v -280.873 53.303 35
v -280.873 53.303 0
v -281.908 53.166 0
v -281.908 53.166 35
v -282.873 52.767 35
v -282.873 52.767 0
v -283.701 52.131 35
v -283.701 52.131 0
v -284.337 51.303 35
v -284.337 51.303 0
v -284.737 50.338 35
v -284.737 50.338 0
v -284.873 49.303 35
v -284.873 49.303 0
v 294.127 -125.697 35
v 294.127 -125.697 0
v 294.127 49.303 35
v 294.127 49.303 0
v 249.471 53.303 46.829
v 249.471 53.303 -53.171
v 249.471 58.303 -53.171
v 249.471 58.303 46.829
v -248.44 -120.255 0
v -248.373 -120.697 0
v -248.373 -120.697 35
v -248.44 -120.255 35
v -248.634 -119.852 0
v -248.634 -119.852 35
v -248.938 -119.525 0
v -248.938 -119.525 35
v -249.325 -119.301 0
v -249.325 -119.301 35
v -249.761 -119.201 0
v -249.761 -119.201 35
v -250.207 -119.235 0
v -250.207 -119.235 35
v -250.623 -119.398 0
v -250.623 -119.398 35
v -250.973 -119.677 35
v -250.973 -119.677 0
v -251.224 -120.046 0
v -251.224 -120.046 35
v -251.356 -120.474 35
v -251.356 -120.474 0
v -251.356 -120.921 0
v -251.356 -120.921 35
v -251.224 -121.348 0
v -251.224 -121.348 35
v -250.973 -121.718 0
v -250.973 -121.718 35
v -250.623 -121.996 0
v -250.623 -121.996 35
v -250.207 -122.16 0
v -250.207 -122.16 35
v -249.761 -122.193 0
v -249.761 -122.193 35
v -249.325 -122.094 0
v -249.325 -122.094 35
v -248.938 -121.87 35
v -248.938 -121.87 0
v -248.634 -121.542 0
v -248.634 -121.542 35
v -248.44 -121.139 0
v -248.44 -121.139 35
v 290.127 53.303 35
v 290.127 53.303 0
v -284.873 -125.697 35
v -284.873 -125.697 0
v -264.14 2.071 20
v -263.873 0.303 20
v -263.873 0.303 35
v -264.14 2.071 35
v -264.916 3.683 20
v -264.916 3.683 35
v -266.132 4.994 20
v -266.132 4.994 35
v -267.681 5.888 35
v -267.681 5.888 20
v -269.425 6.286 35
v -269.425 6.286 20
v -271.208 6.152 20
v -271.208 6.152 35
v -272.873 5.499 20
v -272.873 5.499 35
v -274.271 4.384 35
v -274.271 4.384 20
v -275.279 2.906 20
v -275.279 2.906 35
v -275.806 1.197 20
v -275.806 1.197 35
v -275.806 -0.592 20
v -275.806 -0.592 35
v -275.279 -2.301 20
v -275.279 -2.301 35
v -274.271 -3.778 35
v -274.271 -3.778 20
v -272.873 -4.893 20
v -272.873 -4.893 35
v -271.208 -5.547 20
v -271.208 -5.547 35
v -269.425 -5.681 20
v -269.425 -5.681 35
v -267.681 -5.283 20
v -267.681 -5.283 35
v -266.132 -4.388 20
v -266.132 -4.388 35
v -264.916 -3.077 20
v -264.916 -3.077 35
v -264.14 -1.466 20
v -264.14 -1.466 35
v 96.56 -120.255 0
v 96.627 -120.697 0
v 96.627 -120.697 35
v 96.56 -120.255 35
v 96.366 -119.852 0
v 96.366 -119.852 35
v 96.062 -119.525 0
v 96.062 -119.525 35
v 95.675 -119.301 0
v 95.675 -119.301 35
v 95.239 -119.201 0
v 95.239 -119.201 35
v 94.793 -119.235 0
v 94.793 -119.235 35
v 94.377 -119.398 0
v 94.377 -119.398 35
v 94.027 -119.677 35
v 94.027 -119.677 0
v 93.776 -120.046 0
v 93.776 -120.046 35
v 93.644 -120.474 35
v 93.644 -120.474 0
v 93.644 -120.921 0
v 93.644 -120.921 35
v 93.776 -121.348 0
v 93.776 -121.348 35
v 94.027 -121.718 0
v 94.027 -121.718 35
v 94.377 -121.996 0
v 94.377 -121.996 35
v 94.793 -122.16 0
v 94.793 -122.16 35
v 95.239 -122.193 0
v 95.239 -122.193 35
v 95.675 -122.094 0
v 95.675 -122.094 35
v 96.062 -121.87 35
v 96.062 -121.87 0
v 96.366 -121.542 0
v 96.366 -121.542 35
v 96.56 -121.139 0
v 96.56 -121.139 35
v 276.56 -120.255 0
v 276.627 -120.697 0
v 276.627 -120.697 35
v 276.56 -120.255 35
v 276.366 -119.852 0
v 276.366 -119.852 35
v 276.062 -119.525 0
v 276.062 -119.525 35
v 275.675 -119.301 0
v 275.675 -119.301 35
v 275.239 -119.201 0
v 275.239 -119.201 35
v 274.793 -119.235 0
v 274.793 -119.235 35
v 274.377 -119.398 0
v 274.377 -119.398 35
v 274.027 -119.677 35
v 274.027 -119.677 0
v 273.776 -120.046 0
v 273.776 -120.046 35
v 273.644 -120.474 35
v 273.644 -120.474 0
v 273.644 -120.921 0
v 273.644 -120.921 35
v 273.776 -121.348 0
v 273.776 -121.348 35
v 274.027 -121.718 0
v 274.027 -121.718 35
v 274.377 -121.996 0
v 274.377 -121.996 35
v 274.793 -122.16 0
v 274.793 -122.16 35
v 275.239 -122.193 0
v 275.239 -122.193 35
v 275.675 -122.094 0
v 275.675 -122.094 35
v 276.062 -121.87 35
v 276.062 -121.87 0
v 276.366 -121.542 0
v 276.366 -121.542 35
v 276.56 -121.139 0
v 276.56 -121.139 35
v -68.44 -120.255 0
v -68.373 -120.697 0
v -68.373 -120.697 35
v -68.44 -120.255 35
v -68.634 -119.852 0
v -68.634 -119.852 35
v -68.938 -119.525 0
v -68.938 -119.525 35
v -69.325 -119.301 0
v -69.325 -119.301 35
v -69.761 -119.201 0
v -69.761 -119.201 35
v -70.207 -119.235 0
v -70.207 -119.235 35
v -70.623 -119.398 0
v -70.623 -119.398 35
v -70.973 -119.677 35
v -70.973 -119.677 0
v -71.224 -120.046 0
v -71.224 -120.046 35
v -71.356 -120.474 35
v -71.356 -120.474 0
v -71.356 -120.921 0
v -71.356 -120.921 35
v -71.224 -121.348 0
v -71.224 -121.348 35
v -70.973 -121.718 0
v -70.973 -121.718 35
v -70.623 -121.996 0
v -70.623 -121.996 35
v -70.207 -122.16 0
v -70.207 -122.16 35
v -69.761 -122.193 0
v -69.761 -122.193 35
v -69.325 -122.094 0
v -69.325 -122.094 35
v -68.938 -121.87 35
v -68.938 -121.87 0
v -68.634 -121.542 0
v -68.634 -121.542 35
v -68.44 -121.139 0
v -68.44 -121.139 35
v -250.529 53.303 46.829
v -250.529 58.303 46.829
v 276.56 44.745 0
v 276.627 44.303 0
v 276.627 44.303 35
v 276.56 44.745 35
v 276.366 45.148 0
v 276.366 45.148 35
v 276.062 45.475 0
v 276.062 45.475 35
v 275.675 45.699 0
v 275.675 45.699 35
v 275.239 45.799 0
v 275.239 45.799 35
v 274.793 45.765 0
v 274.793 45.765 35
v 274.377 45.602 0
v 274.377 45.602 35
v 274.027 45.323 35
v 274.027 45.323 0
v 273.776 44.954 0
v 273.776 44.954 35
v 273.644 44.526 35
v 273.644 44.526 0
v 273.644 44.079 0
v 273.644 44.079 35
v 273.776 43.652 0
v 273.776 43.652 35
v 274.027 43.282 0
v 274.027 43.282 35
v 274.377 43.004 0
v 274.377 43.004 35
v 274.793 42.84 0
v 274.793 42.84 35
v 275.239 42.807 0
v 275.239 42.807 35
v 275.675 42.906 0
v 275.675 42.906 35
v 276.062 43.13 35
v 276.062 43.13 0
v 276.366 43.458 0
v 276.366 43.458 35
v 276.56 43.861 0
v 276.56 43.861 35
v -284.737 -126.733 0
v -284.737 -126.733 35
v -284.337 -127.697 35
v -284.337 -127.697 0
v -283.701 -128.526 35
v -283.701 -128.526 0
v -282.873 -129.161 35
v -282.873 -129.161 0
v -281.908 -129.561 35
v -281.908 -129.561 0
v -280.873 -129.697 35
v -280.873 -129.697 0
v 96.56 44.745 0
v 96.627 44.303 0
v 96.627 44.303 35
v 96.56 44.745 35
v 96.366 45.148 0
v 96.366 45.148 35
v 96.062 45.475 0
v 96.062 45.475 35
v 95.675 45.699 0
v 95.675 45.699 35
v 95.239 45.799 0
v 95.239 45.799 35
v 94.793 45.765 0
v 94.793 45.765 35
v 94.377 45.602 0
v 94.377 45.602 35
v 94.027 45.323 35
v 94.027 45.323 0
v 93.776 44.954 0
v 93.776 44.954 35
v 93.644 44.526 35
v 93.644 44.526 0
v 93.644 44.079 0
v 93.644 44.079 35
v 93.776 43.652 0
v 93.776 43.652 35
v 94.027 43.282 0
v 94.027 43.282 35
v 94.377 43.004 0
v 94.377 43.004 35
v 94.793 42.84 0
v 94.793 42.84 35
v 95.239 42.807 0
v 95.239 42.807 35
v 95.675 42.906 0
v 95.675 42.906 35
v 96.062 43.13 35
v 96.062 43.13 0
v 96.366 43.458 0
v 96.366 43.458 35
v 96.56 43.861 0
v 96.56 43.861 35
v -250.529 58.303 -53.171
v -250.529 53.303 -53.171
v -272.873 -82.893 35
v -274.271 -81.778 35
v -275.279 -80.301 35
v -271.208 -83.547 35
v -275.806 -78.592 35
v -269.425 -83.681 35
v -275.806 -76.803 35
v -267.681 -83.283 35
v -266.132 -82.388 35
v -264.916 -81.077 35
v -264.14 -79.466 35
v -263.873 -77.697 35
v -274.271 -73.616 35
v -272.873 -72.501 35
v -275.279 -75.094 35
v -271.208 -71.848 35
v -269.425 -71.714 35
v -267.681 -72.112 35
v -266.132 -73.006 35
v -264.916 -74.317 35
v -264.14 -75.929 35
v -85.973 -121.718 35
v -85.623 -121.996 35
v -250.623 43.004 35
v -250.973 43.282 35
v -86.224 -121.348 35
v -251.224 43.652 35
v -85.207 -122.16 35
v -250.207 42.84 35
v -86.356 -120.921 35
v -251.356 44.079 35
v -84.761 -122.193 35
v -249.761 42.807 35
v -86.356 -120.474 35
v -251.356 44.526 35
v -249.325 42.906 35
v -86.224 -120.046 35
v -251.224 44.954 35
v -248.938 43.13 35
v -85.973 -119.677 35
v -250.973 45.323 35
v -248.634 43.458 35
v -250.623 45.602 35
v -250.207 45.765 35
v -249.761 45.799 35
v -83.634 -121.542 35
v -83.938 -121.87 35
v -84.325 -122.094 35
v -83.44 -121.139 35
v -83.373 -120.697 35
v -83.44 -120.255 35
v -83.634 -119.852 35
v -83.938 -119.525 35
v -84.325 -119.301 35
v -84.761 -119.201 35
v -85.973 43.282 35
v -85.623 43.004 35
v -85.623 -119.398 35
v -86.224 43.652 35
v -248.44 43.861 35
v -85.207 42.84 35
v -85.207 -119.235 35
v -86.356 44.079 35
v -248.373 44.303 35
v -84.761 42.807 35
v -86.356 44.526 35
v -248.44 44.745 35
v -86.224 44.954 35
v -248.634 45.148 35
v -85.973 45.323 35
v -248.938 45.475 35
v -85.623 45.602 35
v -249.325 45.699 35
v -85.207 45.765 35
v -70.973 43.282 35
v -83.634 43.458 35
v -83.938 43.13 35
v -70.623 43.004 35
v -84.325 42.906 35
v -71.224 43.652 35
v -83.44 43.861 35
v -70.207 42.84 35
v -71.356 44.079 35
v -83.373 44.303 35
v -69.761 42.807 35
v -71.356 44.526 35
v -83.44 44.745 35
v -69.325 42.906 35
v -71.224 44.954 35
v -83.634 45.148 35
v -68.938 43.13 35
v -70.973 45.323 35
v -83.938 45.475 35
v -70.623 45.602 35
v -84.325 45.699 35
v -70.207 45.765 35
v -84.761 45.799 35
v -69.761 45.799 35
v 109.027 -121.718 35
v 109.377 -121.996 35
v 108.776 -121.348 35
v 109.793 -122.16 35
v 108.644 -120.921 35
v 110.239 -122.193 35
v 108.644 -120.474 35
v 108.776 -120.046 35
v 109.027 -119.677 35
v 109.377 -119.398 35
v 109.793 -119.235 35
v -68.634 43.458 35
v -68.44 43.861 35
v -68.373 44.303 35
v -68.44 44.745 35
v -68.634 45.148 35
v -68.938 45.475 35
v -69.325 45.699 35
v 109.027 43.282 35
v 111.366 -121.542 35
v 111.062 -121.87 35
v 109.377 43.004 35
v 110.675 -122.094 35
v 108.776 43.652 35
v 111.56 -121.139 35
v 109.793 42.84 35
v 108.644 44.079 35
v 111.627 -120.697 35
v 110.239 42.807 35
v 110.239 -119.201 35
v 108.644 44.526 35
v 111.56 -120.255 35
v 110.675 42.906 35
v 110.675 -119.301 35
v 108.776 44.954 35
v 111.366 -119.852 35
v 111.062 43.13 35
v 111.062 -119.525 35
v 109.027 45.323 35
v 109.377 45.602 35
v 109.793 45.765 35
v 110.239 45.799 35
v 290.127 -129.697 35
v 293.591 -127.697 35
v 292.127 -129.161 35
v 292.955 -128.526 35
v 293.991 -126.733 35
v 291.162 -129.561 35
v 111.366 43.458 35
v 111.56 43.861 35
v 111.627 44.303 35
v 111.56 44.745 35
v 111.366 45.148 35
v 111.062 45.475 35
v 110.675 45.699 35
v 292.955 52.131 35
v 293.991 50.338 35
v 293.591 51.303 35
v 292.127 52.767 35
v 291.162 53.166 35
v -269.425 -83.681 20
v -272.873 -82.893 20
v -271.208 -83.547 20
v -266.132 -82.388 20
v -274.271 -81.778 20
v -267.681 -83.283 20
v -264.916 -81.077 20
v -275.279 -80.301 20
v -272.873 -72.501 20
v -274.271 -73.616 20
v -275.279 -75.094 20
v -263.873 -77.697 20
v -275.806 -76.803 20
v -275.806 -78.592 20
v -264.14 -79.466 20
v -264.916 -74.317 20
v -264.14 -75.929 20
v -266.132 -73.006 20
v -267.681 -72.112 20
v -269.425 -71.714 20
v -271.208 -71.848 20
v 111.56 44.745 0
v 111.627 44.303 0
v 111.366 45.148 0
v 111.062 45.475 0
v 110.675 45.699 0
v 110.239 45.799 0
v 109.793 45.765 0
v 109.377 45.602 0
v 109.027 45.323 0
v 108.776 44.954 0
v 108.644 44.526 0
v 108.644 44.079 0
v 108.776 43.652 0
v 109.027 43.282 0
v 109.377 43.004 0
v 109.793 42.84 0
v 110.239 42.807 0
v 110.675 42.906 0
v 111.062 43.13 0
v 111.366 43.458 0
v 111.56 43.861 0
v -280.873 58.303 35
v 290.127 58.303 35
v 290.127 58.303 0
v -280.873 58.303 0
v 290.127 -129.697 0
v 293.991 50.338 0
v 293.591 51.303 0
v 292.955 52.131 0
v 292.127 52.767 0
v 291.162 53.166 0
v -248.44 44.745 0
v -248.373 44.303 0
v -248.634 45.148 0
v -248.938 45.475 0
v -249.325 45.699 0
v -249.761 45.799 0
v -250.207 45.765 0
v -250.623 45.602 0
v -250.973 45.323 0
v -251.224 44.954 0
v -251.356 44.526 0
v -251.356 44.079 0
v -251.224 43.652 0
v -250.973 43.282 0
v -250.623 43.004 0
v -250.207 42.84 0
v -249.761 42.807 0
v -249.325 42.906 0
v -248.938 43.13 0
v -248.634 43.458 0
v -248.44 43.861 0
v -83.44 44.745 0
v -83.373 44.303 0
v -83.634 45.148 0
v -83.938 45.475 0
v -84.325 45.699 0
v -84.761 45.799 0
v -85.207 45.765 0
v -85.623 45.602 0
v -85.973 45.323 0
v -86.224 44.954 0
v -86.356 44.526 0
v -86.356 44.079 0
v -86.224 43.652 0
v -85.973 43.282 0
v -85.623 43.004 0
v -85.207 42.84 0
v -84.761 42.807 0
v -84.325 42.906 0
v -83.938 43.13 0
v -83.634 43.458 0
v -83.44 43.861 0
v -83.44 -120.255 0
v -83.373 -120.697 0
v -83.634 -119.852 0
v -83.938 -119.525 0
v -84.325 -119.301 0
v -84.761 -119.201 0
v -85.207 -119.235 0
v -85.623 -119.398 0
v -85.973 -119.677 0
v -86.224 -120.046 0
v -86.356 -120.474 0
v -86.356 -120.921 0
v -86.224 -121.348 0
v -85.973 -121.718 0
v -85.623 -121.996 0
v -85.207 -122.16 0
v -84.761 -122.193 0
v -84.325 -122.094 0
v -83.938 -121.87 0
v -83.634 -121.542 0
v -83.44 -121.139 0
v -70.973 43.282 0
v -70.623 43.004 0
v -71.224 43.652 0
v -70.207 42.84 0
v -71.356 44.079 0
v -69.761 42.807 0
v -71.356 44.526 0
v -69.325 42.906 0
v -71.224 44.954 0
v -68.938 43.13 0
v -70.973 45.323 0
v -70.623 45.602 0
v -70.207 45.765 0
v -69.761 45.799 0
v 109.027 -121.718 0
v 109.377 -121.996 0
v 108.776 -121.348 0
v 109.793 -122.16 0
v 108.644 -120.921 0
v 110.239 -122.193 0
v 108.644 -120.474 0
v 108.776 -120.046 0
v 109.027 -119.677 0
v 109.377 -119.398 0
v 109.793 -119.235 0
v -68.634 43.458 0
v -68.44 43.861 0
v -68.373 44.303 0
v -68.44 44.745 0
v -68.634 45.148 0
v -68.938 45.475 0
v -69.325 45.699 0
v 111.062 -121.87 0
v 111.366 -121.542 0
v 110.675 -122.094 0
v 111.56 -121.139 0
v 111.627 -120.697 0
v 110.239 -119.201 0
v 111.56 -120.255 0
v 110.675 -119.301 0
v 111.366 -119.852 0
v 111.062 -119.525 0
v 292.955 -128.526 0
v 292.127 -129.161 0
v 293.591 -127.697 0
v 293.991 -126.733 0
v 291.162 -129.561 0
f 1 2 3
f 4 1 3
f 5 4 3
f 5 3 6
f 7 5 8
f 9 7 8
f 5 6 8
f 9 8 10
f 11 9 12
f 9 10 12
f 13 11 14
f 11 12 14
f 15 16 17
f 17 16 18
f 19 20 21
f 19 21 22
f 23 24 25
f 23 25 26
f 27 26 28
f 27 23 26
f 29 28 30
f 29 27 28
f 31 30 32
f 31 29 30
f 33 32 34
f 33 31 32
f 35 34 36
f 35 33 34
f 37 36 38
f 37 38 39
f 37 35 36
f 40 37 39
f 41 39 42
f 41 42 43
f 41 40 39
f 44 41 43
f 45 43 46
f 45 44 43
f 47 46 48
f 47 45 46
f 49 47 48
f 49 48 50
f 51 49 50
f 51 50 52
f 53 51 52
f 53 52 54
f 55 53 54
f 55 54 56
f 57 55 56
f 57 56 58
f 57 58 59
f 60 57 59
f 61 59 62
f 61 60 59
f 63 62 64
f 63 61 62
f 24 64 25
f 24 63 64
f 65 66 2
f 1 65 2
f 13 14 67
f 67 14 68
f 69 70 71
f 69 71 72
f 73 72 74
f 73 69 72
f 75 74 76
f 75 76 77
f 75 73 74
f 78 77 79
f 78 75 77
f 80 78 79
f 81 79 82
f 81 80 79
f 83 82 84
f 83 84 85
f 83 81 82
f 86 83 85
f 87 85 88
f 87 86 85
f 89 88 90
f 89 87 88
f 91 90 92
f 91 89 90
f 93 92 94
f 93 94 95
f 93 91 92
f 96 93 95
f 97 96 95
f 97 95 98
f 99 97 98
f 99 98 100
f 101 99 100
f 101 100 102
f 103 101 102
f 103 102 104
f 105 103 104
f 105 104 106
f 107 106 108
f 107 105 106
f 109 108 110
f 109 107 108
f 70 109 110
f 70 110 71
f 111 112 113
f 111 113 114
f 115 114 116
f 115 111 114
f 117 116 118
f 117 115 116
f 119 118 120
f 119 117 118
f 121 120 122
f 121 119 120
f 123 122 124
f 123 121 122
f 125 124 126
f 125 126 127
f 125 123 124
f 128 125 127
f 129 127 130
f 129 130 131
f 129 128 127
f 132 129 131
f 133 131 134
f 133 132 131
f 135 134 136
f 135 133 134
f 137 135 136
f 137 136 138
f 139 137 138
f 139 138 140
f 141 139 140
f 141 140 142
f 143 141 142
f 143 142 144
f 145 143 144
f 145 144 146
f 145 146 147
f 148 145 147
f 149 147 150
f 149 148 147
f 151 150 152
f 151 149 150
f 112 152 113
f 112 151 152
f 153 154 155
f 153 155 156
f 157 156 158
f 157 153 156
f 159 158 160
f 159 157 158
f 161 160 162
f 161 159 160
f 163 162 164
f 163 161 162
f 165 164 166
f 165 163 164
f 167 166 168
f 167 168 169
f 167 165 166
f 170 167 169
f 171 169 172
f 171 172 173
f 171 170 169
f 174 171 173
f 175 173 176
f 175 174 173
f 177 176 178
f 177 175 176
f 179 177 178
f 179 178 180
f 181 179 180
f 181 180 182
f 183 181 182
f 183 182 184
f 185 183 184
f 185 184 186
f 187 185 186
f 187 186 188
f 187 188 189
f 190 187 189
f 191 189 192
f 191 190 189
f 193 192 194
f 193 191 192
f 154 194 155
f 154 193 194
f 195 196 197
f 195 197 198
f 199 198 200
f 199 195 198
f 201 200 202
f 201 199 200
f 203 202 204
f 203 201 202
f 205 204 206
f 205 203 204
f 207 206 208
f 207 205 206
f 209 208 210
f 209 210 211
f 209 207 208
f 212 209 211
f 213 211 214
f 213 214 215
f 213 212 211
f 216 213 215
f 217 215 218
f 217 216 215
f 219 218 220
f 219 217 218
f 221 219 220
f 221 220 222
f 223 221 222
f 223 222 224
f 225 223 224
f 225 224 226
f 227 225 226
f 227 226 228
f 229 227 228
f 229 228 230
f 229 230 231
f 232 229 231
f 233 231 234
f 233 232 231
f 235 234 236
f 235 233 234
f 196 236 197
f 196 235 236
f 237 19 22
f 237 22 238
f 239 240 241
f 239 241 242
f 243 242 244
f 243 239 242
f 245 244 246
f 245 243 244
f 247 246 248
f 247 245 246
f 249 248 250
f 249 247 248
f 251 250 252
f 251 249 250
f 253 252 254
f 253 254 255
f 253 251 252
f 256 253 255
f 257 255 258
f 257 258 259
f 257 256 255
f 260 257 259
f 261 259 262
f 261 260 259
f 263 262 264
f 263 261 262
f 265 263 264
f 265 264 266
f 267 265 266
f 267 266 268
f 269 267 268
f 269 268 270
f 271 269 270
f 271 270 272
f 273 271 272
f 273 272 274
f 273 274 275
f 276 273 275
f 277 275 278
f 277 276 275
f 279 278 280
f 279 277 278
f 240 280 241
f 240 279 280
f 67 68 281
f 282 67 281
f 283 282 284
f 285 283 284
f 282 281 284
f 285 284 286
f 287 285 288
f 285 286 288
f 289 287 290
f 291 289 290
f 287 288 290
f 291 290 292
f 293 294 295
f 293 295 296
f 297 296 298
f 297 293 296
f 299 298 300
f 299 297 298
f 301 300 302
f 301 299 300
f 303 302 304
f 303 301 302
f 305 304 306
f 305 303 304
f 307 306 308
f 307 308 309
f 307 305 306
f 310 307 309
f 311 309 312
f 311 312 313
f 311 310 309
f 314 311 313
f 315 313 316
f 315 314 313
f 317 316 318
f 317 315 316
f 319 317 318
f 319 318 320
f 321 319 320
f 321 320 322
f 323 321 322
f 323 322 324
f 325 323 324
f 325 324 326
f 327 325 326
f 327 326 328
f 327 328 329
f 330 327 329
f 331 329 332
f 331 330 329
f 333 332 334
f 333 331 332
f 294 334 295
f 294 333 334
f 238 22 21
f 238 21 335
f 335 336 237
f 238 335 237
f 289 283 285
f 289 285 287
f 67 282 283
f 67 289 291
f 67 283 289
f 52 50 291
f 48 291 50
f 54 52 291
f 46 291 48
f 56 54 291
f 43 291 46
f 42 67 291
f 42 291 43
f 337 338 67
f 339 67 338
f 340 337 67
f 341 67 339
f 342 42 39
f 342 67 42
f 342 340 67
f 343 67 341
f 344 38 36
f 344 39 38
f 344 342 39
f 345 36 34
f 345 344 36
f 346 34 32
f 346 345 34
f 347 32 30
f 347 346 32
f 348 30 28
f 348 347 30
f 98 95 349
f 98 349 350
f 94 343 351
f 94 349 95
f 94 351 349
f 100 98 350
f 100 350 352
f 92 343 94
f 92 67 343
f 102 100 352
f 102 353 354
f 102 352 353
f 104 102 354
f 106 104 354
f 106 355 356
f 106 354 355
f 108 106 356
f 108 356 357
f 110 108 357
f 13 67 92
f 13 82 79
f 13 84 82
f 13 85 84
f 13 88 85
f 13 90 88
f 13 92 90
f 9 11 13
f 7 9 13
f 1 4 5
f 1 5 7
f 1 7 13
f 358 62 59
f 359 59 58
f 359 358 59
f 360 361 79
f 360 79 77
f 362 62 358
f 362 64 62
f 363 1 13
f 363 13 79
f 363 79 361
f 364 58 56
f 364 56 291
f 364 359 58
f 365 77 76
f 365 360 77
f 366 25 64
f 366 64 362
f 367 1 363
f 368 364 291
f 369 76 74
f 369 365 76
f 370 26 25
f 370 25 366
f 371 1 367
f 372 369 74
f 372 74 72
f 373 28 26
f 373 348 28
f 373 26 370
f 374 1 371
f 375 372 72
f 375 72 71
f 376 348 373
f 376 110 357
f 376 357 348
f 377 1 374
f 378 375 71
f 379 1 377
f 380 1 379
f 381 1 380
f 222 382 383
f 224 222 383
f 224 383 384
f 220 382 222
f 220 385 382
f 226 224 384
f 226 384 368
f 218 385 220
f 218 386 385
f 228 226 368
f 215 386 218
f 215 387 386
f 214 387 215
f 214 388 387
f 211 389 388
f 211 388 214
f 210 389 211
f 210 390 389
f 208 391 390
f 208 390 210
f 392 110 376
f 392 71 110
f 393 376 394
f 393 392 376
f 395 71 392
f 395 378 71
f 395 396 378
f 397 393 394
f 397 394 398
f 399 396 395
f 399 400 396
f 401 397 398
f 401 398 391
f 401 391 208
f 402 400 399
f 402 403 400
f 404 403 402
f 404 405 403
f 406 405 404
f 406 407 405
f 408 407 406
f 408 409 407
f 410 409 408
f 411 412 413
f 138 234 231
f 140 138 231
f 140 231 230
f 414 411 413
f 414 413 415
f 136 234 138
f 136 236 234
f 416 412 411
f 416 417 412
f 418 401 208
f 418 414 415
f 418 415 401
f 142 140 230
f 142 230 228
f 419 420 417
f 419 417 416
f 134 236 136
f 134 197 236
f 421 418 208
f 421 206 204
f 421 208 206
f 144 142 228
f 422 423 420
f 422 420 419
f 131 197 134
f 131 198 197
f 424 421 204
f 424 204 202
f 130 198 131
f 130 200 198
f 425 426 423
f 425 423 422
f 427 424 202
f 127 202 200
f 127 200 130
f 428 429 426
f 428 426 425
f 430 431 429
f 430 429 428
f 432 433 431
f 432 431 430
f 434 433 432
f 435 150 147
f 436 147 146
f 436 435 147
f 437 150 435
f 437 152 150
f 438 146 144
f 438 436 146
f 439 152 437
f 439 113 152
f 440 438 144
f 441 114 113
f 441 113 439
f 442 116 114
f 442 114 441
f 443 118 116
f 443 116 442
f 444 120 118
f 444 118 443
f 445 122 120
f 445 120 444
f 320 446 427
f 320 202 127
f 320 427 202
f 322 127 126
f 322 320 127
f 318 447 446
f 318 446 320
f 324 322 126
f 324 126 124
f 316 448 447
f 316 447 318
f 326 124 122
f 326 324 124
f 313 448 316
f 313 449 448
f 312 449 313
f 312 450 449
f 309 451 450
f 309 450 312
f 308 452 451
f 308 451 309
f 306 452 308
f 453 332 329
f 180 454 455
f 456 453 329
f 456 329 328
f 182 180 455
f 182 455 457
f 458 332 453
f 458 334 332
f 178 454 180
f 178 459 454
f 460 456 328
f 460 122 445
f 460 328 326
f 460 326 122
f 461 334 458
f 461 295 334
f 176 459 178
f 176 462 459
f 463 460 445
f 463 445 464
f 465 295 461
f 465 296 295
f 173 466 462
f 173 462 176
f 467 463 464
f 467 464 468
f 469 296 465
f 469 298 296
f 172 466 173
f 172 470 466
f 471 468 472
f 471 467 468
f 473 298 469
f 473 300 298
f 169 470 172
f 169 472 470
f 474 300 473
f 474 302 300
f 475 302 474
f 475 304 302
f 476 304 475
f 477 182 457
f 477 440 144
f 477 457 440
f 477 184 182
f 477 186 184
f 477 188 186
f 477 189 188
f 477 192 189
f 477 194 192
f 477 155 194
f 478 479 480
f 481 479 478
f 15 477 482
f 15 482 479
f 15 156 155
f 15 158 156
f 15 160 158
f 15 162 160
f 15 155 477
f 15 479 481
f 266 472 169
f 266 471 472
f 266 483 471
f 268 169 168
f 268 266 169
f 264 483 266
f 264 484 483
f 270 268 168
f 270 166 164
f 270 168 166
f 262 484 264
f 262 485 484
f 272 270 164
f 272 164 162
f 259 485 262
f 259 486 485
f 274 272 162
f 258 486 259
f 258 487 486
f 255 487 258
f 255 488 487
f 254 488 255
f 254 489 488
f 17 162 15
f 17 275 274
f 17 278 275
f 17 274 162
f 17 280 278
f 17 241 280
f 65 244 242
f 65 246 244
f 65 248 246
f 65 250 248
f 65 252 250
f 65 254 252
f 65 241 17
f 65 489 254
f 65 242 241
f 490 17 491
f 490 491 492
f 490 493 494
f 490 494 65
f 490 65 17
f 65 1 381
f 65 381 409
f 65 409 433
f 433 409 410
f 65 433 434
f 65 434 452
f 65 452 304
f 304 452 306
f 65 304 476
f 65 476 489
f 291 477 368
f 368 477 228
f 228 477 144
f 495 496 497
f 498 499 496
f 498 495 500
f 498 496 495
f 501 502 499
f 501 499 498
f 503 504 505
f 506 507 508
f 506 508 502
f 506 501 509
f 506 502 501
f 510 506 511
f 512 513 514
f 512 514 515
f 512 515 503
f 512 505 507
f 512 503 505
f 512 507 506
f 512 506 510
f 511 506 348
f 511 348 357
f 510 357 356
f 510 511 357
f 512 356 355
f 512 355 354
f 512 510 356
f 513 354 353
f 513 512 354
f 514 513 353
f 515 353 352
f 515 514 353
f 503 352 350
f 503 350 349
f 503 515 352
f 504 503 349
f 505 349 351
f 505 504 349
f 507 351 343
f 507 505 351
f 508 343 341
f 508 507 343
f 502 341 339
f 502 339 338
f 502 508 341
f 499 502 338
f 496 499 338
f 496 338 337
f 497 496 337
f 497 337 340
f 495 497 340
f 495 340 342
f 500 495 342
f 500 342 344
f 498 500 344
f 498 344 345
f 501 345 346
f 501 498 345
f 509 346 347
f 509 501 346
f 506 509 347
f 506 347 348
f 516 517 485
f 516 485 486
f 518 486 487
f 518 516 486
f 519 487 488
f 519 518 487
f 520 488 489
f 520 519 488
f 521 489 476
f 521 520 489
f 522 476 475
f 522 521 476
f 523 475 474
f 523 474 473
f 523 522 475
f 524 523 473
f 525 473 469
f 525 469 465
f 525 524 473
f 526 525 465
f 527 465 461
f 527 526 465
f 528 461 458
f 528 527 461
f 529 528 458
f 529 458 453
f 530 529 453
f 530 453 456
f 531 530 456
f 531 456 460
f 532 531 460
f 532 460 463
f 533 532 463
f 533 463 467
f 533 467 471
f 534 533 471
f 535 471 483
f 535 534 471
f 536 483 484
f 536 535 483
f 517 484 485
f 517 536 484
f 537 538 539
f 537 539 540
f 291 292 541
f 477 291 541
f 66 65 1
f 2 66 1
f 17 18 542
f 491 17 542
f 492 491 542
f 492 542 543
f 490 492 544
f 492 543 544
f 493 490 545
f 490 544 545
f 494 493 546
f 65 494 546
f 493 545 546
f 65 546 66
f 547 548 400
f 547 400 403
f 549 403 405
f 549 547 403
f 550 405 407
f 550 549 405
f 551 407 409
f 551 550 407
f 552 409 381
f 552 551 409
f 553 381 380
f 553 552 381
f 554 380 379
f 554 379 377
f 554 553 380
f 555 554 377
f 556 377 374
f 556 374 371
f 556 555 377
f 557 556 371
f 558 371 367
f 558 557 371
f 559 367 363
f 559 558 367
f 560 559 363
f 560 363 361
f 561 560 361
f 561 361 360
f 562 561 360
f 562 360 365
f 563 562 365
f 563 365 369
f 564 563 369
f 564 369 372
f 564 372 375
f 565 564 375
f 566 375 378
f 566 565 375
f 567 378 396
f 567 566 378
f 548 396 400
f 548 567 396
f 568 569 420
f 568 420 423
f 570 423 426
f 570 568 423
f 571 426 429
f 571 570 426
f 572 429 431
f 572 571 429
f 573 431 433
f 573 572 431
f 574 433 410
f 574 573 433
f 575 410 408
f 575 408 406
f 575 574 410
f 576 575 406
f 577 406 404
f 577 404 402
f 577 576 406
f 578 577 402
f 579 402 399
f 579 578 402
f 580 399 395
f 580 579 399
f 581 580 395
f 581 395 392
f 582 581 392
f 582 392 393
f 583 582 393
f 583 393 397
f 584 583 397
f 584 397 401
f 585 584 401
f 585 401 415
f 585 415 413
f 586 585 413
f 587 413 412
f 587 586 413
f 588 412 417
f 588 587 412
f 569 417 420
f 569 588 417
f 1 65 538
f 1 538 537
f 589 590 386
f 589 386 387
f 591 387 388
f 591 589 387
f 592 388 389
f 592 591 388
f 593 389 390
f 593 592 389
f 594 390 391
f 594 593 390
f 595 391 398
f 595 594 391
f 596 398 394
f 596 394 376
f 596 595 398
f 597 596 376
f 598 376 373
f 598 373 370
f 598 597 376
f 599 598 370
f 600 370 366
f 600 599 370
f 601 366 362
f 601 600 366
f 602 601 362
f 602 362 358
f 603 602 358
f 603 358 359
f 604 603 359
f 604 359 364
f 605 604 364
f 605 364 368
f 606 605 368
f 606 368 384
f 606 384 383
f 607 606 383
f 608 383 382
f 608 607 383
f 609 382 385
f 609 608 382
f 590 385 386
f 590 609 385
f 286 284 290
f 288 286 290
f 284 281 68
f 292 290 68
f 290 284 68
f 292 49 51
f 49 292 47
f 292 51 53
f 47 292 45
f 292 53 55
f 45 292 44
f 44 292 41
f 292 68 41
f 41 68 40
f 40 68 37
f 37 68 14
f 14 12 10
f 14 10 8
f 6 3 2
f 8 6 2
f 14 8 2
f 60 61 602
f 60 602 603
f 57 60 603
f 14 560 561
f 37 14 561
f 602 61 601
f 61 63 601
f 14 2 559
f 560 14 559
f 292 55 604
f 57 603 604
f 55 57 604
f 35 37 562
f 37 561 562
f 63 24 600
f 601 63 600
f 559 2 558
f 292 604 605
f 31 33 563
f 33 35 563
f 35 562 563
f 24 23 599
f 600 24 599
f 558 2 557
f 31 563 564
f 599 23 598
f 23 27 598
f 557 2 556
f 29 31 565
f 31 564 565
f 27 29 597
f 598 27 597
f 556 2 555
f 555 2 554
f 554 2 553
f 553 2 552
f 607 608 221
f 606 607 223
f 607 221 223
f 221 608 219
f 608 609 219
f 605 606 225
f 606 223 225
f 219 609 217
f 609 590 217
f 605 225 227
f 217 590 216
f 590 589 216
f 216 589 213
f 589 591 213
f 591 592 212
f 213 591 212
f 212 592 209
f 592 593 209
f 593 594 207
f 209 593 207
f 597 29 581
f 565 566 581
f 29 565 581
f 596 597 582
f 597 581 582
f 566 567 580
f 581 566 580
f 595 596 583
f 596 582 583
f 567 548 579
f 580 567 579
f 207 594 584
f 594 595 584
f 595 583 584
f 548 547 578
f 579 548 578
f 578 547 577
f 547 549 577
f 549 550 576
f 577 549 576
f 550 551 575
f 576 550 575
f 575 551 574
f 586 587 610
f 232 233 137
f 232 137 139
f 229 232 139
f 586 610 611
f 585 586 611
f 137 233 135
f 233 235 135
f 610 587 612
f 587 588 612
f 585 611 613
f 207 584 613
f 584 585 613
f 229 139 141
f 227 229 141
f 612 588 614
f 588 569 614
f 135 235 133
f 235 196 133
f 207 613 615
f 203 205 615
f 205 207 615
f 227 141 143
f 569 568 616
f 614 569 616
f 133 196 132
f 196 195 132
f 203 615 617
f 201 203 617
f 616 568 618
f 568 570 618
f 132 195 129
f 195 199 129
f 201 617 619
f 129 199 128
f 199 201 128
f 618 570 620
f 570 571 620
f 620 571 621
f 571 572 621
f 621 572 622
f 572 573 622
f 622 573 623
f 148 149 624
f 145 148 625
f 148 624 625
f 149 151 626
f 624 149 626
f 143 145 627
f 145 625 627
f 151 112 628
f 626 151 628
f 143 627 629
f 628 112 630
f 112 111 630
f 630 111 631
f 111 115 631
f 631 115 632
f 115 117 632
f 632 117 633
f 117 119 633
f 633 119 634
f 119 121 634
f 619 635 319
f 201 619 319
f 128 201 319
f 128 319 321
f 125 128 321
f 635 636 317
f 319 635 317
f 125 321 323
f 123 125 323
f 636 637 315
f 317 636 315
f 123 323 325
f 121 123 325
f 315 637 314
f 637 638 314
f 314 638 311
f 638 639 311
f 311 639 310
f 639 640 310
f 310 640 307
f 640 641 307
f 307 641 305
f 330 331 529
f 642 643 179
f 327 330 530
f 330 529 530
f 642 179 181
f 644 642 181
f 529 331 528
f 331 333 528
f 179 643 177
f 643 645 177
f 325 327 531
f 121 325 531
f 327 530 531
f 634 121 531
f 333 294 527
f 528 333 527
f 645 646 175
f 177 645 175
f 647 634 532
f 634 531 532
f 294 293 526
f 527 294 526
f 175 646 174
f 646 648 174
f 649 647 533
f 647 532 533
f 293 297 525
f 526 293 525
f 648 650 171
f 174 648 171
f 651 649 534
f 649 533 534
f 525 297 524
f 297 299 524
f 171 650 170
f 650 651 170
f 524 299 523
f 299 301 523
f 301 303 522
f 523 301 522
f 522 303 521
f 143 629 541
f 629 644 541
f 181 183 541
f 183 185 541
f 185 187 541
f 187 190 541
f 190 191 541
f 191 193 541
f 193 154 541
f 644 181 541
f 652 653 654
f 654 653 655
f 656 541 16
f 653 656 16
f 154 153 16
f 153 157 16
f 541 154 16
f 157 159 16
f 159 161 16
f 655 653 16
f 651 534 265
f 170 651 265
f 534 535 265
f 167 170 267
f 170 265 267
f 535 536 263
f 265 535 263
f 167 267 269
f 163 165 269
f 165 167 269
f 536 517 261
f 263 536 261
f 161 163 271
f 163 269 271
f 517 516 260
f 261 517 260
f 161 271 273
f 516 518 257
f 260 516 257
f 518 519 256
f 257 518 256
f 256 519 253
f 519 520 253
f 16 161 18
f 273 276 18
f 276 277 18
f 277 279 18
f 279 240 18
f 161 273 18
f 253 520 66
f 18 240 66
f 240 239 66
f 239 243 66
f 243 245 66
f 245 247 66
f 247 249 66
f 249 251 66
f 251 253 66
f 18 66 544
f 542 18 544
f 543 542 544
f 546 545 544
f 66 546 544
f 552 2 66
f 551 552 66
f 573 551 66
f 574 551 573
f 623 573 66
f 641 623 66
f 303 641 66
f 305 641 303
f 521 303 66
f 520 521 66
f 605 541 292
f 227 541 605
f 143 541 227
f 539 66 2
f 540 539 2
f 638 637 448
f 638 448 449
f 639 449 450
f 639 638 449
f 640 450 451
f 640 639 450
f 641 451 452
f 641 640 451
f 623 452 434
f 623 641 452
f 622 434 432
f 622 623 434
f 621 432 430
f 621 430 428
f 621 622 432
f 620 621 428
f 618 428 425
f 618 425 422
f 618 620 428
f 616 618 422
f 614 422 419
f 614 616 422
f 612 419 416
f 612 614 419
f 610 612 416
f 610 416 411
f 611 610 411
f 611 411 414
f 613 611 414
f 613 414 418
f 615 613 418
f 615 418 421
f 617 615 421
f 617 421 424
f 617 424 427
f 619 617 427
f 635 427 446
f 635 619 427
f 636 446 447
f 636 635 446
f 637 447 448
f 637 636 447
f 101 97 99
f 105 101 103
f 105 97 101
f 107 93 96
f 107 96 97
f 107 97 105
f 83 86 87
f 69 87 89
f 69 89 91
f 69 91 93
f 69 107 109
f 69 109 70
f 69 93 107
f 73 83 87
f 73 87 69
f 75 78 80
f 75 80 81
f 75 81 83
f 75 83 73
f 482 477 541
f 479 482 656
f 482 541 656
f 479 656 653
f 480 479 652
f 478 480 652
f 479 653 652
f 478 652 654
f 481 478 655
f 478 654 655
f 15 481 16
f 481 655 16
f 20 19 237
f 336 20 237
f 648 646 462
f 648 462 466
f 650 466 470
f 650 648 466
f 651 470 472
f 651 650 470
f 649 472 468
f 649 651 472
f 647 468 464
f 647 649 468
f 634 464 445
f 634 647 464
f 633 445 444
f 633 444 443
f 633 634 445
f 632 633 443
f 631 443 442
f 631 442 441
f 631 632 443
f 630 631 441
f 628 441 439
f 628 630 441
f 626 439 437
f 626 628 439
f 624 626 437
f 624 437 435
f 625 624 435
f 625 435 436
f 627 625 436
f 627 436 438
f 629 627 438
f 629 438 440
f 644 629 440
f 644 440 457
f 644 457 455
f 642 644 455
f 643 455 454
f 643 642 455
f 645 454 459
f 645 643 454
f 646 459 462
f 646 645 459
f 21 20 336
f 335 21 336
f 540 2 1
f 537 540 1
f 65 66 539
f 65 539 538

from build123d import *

# Parameters (mm, degrees)
F0_R     = 1.5
F0_R_2   = 6
F1_DEPTH = 35
F2_START = 20
F2_DEPTH = 15
F3_W     = 571
F3_H     = 35
F4_DEPTH = 5
F5_W     = 500
F5_H     = 100
F6_DEPTH = 5


with BuildPart() as f1:
    # F0 (on Top) → F1 (new body)
    with BuildSketch(Plane.XY):
        with BuildLine():
            Line((290.1270191669, 53.3027102947), (-280.8729808331, 53.3027102947))
            ThreePointArc((-280.8729808331, 53.3027102947), (-283.7014079578, 52.1311374195), (-284.8729808331, 49.3027102947))
            Line((-284.8729808331, 49.3027102947), (-284.8729808331, -125.6972897053))
            ThreePointArc((-284.8729808331, -125.6972897053), (-283.7014079578, -128.52571683), (-280.8729808331, -129.6972897053))
            Line((-280.8729808331, -129.6972897053), (290.1270191669, -129.6972897053))
            ThreePointArc((290.1270191669, -129.6972897053), (292.9554462917, -128.52571683), (294.1270191669, -125.6972897053))
            Line((294.1270191669, -125.6972897053), (294.1270191669, 49.3027102947))
            ThreePointArc((294.1270191669, 49.3027102947), (292.9554462917, 52.1311374195), (290.1270191669, 53.3027102947))
        make_face()
        with Locations((-249.8729808331, -120.6972897053)):
            Circle(F0_R, mode=Mode.SUBTRACT)
        with Locations((-84.8729808331, -120.6972897053)):
            Circle(F0_R, mode=Mode.SUBTRACT)
        with Locations((-69.8729808331, -120.6972897053)):
            Circle(F0_R, mode=Mode.SUBTRACT)
        with Locations((-269.8729808331, -77.6972897053)):
            Circle(F0_R_2, mode=Mode.SUBTRACT)
        with Locations((95.1270191669, -120.6972897053)):
            Circle(F0_R, mode=Mode.SUBTRACT)
        with Locations((110.1270191669, -120.6972897053)):
            Circle(F0_R, mode=Mode.SUBTRACT)
        with Locations((275.1270191669, -120.6972897053)):
            Circle(F0_R, mode=Mode.SUBTRACT)
        with Locations((-269.8729808331, 0.3027102947)):
            Circle(F0_R_2, mode=Mode.SUBTRACT)
        with Locations((-249.8729808331, 44.3027102947)):
            Circle(F0_R, mode=Mode.SUBTRACT)
        with Locations((-84.8729808331, 44.3027102947)):
            Circle(F0_R, mode=Mode.SUBTRACT)
        with Locations((-69.8729808331, 44.3027102947)):
            Circle(F0_R, mode=Mode.SUBTRACT)
        with Locations((95.1270191669, 44.3027102947)):
            Circle(F0_R, mode=Mode.SUBTRACT)
        with Locations((110.1270191669, 44.3027102947)):
            Circle(F0_R, mode=Mode.SUBTRACT)
        with Locations((275.1270191669, 44.3027102947)):
            Circle(F0_R, mode=Mode.SUBTRACT)
        with Locations((-269.8729808331, 0.3027102947)):
            Circle(F0_R_2)
        with Locations((-269.8729808331, -77.6972897053)):
            Circle(F0_R_2)
    extrude(amount=F1_DEPTH)

    # F0 (on Top) → F2 (cut)
    with BuildSketch(Plane.XY.offset(F2_START)):
        with Locations((-269.8729808331, -77.6972897053)):
            Circle(F0_R_2)
        with Locations((-269.8729808331, 0.3027102947)):
            Circle(F0_R_2)
    extrude(amount=F2_DEPTH, mode=Mode.SUBTRACT)


with BuildPart() as f4:
    # F3 (on face) → F4 (new body)
    with BuildSketch(Plane(origin=(0, 53.3027102947, 0), x_dir=(-1, 0, 0), z_dir=(0, 1, 0))):
        with Locations((-4.6270191669, 17.5)):
            Rectangle(F3_W, F3_H)
    extrude(amount=F4_DEPTH)


with BuildPart() as f6:
    # F5 (on face) → F6 (new body)
    with BuildSketch(Plane(origin=(0, 53.3027102947, 0), x_dir=(-1, 0, 0), z_dir=(0, 1, 0))):
        with Locations((0.5285963416, -3.1710242811)):
            Rectangle(F5_W, F5_H)
    extrude(amount=F6_DEPTH)


solid = Compound([f1.part, f4.part, f6.part])
